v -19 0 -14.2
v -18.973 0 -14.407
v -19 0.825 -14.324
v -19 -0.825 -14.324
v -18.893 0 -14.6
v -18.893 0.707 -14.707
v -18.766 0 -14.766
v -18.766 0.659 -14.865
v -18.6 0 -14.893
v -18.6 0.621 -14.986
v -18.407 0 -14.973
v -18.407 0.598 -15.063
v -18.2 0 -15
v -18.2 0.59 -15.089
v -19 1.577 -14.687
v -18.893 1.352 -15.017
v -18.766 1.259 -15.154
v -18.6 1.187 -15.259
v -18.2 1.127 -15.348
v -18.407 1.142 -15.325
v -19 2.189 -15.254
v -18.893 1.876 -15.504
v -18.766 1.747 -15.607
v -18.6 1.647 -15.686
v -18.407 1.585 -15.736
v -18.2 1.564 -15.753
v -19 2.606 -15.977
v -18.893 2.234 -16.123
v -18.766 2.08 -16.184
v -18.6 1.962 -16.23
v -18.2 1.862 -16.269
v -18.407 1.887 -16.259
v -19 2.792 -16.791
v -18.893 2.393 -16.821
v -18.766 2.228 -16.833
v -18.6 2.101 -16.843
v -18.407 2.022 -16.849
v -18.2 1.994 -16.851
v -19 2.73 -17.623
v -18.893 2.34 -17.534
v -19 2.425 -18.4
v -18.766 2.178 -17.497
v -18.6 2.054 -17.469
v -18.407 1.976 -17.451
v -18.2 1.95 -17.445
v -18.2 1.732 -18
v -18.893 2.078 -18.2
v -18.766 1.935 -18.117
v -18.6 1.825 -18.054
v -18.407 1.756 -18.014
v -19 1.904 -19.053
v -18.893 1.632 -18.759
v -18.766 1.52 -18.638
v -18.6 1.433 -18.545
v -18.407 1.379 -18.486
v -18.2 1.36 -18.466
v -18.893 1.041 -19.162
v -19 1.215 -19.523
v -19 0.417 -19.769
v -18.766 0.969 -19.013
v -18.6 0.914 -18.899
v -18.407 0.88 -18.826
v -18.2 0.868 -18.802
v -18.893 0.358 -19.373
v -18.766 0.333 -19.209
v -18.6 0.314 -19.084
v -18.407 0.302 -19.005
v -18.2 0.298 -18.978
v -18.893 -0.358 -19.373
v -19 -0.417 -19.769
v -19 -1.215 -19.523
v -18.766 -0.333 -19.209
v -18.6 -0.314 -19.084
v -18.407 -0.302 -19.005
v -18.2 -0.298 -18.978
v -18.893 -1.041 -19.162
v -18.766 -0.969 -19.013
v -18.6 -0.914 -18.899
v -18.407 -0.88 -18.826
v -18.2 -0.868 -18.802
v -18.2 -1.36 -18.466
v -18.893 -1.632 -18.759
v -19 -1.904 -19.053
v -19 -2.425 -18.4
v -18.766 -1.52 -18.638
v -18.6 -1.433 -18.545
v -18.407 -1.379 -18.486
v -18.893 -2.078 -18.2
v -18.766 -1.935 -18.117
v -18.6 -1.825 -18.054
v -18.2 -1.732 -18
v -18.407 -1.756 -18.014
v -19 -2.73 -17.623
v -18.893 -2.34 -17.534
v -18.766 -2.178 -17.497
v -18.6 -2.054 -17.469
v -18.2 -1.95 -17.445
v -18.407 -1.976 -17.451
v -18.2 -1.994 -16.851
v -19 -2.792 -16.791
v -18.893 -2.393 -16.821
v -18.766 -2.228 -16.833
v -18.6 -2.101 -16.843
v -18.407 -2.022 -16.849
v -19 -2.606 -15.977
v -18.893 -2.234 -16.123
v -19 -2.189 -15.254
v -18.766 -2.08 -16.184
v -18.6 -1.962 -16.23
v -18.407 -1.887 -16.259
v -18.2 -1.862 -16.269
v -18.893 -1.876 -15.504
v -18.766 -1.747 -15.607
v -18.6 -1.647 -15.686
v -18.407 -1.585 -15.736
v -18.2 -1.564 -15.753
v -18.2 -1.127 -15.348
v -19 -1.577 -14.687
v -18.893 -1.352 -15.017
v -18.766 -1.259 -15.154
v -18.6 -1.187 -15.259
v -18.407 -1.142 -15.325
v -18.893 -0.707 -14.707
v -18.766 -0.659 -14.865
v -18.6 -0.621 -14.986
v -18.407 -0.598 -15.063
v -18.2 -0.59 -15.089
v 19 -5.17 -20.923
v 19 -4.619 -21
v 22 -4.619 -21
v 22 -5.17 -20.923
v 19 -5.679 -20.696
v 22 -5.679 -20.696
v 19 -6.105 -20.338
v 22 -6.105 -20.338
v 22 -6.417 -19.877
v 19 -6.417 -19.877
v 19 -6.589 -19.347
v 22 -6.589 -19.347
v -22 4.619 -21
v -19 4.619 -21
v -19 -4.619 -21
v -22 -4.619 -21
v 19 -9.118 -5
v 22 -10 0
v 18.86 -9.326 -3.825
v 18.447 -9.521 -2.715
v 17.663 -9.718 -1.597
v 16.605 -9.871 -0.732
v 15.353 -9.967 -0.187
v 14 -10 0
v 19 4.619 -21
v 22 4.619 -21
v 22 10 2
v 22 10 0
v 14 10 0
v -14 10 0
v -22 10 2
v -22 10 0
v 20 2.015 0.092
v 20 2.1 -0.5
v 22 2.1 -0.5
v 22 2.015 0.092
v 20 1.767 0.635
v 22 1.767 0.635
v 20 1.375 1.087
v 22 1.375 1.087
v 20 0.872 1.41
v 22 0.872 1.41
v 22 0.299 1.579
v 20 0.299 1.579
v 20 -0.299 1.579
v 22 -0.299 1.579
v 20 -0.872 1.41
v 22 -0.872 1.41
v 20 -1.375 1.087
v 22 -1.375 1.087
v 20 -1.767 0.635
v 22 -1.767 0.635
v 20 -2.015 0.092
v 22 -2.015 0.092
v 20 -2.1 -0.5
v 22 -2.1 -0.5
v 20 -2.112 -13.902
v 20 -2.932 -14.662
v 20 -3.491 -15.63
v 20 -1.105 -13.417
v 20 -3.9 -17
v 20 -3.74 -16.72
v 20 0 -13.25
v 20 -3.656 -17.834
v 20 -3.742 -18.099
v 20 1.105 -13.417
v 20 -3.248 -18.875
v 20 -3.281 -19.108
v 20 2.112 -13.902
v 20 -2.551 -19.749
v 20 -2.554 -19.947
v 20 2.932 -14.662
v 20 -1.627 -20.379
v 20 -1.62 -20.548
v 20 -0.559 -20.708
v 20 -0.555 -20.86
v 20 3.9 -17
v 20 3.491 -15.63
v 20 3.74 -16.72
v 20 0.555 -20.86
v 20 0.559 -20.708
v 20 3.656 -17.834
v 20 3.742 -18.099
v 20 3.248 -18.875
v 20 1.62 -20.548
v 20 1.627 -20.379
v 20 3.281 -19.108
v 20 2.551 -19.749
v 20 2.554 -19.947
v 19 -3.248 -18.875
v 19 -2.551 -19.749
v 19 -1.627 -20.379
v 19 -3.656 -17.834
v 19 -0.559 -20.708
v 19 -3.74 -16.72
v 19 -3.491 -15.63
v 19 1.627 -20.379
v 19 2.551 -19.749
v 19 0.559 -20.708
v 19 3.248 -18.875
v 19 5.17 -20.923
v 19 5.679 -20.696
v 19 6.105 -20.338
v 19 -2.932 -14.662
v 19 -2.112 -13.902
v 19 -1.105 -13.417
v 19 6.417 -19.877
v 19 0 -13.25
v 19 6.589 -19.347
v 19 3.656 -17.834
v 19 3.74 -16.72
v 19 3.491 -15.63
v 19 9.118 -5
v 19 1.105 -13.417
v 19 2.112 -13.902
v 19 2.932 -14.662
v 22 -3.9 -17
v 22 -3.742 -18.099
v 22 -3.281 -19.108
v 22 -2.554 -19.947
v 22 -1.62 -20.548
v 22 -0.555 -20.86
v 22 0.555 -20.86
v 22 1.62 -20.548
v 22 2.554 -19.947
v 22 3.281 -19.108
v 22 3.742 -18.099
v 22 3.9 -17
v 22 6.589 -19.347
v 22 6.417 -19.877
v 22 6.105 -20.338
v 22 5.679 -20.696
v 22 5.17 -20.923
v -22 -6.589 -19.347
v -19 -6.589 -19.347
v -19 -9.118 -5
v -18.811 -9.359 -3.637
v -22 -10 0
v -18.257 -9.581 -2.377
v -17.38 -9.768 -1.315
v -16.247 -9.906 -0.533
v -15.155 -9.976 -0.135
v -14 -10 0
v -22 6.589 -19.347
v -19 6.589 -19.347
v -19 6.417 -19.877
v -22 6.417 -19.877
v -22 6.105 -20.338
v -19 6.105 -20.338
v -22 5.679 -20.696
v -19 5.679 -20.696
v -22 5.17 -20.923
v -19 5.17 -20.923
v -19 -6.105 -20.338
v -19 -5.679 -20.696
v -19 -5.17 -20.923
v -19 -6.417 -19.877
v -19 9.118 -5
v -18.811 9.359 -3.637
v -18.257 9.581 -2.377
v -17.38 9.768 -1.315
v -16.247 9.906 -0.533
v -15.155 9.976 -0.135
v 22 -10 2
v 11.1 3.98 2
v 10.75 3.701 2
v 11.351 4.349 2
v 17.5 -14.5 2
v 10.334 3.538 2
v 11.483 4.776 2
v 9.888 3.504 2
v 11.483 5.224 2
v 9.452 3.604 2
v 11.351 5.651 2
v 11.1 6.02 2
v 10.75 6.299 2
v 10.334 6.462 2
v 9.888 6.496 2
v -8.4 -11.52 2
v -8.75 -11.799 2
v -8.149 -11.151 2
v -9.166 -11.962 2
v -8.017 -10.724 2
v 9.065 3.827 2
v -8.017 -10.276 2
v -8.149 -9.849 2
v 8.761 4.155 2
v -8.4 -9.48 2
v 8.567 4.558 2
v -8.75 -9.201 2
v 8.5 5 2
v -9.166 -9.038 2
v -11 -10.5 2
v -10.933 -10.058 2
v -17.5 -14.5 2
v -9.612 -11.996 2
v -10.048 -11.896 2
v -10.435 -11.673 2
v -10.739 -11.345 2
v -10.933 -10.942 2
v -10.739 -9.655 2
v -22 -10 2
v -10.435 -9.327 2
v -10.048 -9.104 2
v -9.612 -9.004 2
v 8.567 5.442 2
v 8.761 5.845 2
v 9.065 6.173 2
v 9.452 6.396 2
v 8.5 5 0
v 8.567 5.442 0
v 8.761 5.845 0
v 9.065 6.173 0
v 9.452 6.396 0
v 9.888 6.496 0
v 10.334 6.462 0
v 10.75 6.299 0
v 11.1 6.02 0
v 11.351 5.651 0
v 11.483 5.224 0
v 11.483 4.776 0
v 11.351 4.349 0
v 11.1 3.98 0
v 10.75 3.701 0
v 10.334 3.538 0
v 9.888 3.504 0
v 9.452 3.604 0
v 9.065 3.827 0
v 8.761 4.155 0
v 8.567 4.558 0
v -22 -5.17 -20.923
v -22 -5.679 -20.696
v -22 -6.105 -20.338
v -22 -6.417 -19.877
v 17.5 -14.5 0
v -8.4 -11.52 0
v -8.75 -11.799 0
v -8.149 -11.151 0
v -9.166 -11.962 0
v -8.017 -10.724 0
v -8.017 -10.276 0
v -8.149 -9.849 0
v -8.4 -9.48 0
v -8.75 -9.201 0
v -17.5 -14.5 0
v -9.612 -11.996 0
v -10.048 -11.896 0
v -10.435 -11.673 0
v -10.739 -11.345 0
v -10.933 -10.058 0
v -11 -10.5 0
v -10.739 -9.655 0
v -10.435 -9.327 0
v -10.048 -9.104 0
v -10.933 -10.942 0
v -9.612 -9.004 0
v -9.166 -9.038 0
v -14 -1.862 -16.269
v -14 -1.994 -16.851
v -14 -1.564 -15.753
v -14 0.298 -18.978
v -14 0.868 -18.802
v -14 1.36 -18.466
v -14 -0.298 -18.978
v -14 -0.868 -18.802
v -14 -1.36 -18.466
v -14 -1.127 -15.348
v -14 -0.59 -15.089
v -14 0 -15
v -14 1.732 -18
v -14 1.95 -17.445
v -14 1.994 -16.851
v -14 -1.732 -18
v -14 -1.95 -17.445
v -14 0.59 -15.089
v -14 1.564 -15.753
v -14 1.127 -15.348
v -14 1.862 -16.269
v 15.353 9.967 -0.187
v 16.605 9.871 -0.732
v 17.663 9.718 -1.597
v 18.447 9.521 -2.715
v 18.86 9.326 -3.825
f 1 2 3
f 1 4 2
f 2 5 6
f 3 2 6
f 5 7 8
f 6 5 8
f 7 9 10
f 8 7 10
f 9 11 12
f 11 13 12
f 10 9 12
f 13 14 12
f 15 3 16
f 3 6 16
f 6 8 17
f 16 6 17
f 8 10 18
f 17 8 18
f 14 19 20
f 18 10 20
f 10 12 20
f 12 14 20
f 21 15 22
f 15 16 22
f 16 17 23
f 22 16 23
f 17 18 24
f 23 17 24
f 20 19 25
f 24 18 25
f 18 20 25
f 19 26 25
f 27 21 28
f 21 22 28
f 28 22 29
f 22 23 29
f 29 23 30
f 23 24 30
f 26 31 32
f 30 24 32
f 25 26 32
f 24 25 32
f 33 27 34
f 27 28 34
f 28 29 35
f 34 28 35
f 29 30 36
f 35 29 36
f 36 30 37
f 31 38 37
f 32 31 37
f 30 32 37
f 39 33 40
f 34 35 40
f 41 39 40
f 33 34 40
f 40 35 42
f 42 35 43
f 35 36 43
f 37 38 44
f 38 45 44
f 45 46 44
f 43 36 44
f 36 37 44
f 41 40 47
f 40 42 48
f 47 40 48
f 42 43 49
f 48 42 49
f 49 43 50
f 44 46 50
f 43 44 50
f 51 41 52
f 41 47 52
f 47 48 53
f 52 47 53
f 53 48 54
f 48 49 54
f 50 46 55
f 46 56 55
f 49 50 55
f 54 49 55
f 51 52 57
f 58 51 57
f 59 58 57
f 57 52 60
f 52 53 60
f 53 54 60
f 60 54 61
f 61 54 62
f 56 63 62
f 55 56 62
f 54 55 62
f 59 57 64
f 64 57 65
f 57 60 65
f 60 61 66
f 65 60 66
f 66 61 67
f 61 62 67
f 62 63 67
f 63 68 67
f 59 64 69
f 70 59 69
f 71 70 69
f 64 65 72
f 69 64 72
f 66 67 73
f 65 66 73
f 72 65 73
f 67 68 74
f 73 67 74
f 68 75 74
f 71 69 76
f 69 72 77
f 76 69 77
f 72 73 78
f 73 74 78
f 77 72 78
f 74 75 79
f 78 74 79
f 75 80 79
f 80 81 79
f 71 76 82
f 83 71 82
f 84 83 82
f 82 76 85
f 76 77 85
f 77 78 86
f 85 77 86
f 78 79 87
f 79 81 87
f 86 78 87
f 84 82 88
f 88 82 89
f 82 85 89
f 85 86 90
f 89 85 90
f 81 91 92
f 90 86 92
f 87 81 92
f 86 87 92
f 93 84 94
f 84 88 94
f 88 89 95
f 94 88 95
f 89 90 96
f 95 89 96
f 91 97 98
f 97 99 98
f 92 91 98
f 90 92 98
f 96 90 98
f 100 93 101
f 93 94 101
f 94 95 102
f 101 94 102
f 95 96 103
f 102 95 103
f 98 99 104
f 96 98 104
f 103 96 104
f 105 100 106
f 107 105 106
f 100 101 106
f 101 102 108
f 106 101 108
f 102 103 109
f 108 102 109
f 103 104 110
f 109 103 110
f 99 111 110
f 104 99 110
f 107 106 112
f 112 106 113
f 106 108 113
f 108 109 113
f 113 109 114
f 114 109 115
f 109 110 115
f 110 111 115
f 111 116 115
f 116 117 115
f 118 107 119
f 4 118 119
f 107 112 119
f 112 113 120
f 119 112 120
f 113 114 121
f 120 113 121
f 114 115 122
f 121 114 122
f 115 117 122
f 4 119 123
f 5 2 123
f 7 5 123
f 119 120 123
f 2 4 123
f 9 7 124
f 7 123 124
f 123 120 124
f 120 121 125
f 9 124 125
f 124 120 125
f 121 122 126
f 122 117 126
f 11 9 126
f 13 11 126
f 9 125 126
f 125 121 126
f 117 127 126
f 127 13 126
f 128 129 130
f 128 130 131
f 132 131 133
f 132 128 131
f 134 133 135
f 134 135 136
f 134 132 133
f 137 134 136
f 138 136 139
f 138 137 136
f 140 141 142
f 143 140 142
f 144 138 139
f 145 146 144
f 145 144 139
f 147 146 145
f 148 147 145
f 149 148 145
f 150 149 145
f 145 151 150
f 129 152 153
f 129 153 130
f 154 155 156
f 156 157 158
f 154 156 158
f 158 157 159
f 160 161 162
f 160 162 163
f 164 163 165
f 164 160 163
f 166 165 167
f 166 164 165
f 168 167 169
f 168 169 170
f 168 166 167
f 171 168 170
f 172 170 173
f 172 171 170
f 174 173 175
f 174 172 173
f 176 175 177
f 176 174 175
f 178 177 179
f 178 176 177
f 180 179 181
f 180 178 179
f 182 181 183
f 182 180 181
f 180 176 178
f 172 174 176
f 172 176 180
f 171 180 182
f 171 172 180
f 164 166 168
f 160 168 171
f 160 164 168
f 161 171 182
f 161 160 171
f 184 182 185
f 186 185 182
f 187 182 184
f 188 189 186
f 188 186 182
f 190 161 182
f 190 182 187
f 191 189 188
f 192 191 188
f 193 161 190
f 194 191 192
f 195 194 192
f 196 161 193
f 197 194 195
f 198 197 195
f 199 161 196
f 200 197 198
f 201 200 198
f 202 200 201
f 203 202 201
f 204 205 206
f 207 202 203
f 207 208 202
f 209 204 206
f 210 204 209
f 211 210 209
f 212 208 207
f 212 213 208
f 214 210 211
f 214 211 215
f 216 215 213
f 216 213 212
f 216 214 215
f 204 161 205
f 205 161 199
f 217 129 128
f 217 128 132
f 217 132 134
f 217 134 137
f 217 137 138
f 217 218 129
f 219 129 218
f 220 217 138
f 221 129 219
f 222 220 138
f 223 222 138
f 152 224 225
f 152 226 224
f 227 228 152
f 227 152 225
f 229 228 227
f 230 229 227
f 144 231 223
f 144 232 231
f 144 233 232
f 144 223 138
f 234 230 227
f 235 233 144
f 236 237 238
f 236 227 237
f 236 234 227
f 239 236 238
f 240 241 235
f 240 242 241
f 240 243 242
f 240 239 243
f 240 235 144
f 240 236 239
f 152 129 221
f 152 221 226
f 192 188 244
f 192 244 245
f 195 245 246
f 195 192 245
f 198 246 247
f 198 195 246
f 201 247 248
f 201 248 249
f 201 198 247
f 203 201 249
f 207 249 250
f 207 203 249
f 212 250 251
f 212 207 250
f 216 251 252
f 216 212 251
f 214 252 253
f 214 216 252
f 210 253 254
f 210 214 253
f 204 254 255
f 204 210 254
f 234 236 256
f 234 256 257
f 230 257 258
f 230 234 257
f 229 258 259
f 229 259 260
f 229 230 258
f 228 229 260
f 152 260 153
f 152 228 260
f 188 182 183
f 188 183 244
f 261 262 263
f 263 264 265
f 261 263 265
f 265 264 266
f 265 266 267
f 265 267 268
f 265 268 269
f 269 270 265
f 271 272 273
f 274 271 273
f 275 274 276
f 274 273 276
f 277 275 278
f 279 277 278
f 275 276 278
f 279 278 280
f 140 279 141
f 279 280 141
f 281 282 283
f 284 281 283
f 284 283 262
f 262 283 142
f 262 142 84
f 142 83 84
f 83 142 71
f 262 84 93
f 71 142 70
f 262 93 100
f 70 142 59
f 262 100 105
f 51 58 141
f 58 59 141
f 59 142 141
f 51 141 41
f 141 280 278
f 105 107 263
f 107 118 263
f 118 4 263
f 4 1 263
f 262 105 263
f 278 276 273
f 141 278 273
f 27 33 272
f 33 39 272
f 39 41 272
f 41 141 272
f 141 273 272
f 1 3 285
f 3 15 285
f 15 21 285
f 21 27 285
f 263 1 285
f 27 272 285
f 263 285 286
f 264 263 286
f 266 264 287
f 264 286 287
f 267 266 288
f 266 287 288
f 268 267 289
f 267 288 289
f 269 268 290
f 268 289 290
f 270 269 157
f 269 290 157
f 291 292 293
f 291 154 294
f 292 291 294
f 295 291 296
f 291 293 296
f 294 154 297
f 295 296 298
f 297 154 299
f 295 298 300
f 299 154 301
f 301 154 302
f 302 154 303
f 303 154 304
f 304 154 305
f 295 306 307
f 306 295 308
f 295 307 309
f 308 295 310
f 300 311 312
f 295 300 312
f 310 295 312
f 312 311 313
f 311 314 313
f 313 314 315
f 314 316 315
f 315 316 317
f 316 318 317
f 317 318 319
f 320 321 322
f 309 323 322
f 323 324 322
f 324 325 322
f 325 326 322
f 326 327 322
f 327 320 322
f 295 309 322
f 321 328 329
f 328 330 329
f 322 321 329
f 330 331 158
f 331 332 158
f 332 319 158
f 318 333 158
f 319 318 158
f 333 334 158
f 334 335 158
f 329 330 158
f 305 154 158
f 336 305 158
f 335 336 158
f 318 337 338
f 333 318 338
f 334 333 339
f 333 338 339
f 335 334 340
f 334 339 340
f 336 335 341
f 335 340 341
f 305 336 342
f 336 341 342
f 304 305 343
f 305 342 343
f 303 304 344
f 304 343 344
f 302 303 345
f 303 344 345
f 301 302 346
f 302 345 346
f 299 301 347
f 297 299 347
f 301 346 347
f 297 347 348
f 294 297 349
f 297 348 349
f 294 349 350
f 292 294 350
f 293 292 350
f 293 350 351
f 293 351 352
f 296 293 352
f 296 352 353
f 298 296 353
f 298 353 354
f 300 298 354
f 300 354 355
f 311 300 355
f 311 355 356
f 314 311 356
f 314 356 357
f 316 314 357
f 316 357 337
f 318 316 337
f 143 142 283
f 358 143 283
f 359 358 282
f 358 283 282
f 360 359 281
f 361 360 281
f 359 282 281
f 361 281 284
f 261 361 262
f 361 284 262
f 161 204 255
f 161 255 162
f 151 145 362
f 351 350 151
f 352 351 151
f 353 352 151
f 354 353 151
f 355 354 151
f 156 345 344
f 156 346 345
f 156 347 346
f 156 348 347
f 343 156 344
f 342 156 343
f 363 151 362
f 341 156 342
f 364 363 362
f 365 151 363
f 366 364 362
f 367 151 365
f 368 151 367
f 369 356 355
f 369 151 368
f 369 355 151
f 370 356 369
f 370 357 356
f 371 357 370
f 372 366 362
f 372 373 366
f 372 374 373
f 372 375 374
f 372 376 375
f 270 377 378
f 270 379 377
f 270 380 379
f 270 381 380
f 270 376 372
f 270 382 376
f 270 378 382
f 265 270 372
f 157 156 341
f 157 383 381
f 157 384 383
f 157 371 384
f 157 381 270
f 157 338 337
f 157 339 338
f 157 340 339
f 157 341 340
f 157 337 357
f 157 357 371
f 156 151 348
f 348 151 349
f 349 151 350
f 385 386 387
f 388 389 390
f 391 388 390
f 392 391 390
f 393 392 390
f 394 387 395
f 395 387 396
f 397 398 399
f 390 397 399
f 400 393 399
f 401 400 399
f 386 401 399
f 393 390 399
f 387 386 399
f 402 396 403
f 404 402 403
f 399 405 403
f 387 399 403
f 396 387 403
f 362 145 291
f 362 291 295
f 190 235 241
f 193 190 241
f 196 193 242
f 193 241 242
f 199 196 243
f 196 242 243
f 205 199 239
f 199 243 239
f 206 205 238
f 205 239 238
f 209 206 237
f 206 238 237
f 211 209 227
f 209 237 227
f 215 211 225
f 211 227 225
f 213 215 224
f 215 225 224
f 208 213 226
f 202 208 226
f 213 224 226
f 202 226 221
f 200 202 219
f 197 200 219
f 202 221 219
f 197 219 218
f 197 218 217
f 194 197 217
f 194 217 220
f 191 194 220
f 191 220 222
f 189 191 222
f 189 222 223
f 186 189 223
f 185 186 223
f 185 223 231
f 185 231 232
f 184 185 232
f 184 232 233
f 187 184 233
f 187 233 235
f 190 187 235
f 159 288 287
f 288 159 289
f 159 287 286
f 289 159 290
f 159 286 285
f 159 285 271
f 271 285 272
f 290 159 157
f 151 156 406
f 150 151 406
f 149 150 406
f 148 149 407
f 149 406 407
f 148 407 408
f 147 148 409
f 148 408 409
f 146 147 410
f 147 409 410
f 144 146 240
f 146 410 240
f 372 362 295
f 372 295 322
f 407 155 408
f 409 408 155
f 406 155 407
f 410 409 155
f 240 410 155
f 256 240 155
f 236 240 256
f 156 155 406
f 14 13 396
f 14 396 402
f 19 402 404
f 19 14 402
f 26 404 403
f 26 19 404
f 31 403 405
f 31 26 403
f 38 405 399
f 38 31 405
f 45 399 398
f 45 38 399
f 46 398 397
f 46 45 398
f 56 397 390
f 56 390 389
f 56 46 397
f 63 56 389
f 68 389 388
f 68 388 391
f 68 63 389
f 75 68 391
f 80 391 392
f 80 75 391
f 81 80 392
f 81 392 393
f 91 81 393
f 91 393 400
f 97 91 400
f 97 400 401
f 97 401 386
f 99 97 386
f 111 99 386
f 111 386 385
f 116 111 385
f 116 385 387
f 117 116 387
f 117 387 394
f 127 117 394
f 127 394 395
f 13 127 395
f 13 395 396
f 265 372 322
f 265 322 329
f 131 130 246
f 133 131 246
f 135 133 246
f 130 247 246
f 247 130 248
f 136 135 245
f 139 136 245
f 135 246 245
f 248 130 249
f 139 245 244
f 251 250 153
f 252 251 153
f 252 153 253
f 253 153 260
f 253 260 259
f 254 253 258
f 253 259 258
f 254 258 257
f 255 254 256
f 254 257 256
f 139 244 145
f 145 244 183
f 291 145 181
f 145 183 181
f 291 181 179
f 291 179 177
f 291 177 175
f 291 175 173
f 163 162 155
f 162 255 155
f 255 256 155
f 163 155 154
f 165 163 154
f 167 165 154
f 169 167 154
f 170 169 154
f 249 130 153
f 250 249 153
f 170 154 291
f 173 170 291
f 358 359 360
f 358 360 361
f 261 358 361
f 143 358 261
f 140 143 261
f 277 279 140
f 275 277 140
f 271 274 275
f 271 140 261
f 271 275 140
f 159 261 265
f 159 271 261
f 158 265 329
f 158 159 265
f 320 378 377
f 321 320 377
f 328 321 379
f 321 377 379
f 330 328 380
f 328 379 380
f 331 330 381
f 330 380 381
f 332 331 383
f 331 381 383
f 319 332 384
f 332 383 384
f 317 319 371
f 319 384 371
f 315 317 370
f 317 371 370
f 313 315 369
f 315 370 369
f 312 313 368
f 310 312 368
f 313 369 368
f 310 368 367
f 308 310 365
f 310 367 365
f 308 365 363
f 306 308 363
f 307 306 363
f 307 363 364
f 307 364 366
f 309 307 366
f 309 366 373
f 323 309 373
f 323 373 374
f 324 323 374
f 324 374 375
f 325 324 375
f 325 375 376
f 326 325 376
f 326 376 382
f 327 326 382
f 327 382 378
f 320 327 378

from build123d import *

# Parameters (mm, degrees)
SKETCH1_W           = 38
SKETCH1_H           = 20
BOSS_EXTRUDE1_DEPTH = 2
BOSS_EXTRUDE2_DEPTH = 3
BOSS_EXTRUDE3_DEPTH = 2
SKETCH4_R           = 1.3
CUT_EXTRUDE1_DEPTH  = 51.865017448
CUT_EXTRUDE2_START  = -1
CUT_EXTRUDE2_DEPTH  = 2
SKETCH6_R           = 3.75
CUT_EXTRUDE3_DEPTH  = 2.4
SKETCH7_W           = 44
SKETCH7_H           = 6
CUT_EXTRUDE4_DEPTH  = 34.693471178
SKETCH8_R           = 2
BOSS_EXTRUDE4_DEPTH = 8
FILLET1_R           = 0.8
FILLET2_R           = 5
SKETCH9_R           = 1.5
CUT_EXTRUDE5_DEPTH  = 10


with BuildPart() as part:
    # Sketch1 → Boss-Extrude1 (new body)
    with BuildSketch(Plane.XY):
        Rectangle(SKETCH1_W, SKETCH1_H)
    extrude(amount=BOSS_EXTRUDE1_DEPTH)

    # Sketch2 → Boss-Extrude2 (add)
    with BuildSketch(Plane(origin=(19, 0, 0), x_dir=(0, 0, -1), z_dir=(1, 0, 0))):
        with BuildLine():
            Line((-2, 10), (0, 10))
            Line((0, 10), (19.347296355, 6.588549649))
            ThreePointArc((19.347296355, 6.588549649), (20.532088886, 5.904509362), (21, 4.618934143))
            Line((21, 4.618934143), (21, -4.618934143))
            ThreePointArc((21, -4.618934143), (20.532088886, -5.904509362), (19.347296355, -6.588549649))
            Line((19.347296355, -6.588549649), (0, -10))
            Line((0, -10), (-2, -10))
            Line((-2, -10), (-2, 10))
        make_face()
    boss_extrude2 = extrude(amount=BOSS_EXTRUDE2_DEPTH)

    # Mirror1: Boss-Extrude2 across plane
    add(boss_extrude2.mirror(Plane(origin=(0, 0, 0), x_dir=(0, 0, 1), z_dir=(1, 0, 0))))

    # Sketch3 → Boss-Extrude3 (add)
    with BuildSketch(Plane(origin=(0, 0, 0), x_dir=(-1, 0, 0), z_dir=(0, 0, -1))):
        Polygon((-22, -10), (-17.5, -14.5), (17.5, -14.5), (22, -10), align=None)
        Polygon((-22, 10), (22, 10), (17.5, 14.5), (-17.5, 14.5), align=None)
    extrude(amount=-BOSS_EXTRUDE3_DEPTH)

    # Sketch4 → Cut-Extrude1 (cut, through all)
    with BuildSketch(Plane.ZY.offset(22)):
        with Locations((-17, 0)):
            Circle(SKETCH4_R)
    extrude(amount=-CUT_EXTRUDE1_DEPTH, mode=Mode.SUBTRACT)

    # Sketch5 → Cut-Extrude2 (cut)
    with BuildSketch(Plane.ZY.offset(-19).offset(CUT_EXTRUDE2_START)):
        with BuildLine():
            Line((-0.5, -2.1), (-17, -3.9))
            ThreePointArc((-17, -3.9), (-20.9, 0), (-17, 3.9))
            Line((-17, 3.9), (-0.5, 2.1))
            ThreePointArc((-0.5, 2.1), (1.6, 0), (-0.5, -2.1))
        make_face()
    extrude(amount=-CUT_EXTRUDE2_DEPTH, mode=Mode.SUBTRACT)

    # Sketch6 → Cut-Extrude3 (cut)
    with BuildSketch(Plane.ZY.offset(-19)):
        with Locations((-17, 0)):
            Circle(SKETCH6_R)
    extrude(amount=-CUT_EXTRUDE3_DEPTH, mode=Mode.SUBTRACT)

    # Sketch7 → Cut-Extrude4 (cut, through all)
    with BuildSketch(Plane(origin=(0, 0, 0), x_dir=(-1, 0, 0), z_dir=(0, 0, -1))):
        with Locations((0, 13)):
            Rectangle(SKETCH7_W, SKETCH7_H)
    extrude(amount=-CUT_EXTRUDE4_DEPTH, mode=Mode.SUBTRACT)

    # Sketch8 → Boss-Extrude4 (add)
    with BuildSketch(Plane.ZY.offset(22)):
        with Locations((-17, 0)):
            Circle(SKETCH8_R)
    extrude(amount=-BOSS_EXTRUDE4_DEPTH)

    # Fillet1
    fillet1_edges = [part.edges().sort_by_distance(p)[0] for p in [
        (-19, 0, -19),
    ]]
    fillet(fillet1_edges, radius=FILLET1_R)

    # Fillet2
    fillet2_edges = [part.edges().sort_by_distance(p)[0] for p in [
        (-19, 0, 0),
        (19, 0, 0),
    ]]
    fillet(fillet2_edges, radius=FILLET2_R)

    # Sketch9 → Cut-Extrude5 (cut)
    with BuildSketch(Plane(origin=(0, 0, 0), x_dir=(-1, 0, 0), z_dir=(0, 0, -1))):
        with Locations((-10, 5)):
            Circle(SKETCH9_R)
        with Locations((9.5, -10.5)):
            Circle(SKETCH9_R)
    extrude(amount=-CUT_EXTRUDE5_DEPTH, mode=Mode.SUBTRACT)


solid = part.part
